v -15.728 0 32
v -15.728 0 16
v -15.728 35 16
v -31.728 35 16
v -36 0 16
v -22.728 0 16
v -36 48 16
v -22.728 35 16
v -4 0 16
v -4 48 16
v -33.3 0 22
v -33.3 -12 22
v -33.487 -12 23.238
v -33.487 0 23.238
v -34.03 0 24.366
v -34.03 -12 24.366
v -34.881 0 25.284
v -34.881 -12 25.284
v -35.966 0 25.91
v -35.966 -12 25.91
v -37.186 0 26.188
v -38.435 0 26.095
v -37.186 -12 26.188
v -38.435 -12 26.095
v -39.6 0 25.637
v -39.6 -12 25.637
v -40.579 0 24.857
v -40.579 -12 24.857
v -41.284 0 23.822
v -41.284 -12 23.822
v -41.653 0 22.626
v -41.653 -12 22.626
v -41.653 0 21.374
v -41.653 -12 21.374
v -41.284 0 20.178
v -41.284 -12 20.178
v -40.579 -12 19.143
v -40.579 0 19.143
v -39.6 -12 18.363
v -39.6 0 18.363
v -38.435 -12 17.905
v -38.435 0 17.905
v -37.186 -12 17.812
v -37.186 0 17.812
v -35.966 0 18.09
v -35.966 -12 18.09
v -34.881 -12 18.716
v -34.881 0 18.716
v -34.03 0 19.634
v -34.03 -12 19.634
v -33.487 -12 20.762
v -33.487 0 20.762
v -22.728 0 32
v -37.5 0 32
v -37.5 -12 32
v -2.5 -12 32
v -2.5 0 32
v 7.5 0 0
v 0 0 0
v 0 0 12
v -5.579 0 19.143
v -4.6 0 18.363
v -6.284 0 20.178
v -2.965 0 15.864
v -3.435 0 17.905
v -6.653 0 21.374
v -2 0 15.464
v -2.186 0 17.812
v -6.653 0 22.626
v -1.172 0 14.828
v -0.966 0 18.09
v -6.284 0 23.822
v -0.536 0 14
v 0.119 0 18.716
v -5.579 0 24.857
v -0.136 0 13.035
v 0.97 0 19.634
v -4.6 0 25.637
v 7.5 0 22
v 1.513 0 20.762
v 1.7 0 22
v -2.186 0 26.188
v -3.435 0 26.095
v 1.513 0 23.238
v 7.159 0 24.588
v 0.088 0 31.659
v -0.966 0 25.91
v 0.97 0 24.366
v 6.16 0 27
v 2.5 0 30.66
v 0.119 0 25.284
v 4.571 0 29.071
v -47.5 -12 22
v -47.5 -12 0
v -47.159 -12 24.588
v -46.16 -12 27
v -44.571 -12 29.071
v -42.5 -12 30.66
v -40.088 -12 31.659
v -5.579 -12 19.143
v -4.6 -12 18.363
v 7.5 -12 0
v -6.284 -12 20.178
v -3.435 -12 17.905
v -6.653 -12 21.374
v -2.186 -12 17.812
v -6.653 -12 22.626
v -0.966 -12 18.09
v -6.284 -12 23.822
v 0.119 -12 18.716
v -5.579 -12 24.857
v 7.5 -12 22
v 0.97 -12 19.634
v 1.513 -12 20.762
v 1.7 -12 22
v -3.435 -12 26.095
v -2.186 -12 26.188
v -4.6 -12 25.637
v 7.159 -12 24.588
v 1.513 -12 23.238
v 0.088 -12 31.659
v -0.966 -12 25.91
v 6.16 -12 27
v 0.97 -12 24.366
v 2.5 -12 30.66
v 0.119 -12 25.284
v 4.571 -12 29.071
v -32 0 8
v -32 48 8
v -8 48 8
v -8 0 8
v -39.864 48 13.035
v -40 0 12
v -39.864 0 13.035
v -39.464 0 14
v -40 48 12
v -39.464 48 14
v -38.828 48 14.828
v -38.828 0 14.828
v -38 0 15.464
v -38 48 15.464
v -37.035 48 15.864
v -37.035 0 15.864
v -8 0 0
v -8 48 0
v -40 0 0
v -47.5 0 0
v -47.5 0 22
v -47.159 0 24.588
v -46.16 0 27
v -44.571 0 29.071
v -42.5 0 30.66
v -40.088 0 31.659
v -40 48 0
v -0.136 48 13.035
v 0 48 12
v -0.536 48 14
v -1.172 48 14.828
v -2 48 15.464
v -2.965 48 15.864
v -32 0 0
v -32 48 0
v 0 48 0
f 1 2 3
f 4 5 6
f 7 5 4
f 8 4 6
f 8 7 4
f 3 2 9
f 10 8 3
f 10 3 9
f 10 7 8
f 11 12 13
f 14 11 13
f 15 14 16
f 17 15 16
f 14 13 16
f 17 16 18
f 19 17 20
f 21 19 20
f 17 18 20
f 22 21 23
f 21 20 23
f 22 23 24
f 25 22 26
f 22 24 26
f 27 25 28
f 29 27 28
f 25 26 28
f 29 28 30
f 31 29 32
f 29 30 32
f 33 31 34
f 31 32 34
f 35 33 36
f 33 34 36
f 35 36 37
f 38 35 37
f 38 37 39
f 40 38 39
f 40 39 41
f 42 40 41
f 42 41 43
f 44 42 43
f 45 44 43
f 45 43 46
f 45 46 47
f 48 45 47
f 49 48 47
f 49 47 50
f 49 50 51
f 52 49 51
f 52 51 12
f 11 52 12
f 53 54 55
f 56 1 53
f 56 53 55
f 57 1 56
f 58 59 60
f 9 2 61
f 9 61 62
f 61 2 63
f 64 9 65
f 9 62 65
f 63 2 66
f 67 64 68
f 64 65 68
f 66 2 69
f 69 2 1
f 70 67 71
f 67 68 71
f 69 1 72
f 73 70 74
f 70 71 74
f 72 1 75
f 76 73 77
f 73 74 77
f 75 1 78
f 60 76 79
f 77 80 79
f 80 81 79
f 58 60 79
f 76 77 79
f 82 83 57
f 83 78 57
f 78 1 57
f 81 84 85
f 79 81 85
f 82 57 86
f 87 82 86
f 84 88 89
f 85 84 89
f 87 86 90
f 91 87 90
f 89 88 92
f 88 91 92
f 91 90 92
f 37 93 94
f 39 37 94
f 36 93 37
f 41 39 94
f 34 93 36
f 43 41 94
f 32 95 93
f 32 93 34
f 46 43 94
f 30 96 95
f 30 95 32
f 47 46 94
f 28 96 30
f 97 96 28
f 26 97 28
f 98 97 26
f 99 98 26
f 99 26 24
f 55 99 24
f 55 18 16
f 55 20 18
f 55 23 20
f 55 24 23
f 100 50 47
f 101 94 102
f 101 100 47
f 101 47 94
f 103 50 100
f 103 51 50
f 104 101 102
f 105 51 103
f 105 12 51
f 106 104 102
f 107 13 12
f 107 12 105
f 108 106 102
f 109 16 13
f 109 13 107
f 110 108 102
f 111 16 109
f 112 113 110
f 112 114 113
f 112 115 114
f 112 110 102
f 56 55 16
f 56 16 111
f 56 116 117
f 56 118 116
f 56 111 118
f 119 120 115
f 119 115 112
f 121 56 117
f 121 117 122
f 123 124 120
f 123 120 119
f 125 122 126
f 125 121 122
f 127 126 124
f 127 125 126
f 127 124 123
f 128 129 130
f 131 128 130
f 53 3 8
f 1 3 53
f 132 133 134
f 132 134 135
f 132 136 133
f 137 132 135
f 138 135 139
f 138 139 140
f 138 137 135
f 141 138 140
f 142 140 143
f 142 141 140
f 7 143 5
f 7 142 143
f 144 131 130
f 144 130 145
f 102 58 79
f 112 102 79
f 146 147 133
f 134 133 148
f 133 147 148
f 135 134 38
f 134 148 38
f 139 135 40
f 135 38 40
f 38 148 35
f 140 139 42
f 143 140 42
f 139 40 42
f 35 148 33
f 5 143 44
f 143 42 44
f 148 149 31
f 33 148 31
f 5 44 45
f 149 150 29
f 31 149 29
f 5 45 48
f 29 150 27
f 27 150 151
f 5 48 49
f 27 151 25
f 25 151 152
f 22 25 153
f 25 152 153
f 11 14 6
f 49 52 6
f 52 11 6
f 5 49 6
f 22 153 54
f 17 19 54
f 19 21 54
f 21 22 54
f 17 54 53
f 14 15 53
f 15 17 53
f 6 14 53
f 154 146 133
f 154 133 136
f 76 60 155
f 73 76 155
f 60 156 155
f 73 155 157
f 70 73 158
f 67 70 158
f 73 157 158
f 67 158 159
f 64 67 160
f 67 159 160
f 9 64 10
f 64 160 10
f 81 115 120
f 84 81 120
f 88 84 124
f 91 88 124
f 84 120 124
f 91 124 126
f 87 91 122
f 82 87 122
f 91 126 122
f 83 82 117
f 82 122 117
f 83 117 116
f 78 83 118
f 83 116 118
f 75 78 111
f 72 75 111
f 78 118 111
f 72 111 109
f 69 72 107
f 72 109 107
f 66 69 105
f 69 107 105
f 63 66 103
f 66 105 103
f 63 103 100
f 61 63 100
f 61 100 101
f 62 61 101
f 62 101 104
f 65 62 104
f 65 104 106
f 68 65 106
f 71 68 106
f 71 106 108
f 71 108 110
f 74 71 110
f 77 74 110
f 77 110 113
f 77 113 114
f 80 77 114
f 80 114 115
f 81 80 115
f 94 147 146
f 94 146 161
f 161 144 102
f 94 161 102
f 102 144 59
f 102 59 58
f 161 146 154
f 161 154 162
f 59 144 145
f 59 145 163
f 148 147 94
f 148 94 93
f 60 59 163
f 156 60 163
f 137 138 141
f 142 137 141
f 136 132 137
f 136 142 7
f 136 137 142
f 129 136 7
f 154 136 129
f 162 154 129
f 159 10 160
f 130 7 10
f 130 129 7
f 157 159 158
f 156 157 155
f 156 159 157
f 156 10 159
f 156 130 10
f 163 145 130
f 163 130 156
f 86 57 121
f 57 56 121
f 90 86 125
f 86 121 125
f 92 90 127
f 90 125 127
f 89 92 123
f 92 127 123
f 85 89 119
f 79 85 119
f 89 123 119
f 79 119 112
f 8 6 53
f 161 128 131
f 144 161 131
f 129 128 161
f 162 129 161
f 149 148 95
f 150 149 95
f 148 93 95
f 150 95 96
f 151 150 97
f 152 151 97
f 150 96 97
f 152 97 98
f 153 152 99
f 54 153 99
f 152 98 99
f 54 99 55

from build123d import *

# Parameters (mm, degrees)
IZIM1_W                     = 40
IZIM1_H                     = 48
Y_KSEKLIK_EKSTR_ZYON1_DEPTH = 16
RADYUS4_R                   = 4
IZIM5_W                     = 24
IZIM5_H                     = 8
KES_EKSTR_ZYON1_DEPTH       = 59
IZIM6_W                     = 55
IZIM6_H                     = 32
Y_KSEKLIK_EKSTR_ZYON4_DEPTH = 12
RADYUS7_R                   = 10
IZIM9_R                     = 4.2
KES_EKSTR_ZYON2_DEPTH       = 21
IZIM10_W                    = 7
IZIM10_H                    = 35
Y_KSEKLIK_EKSTR_ZYON5_DEPTH = 16
KES_EKSTR_ZYON3_DEPTH       = 16


with BuildPart() as part:
    # Çizim1 → Yükseklik-Ekstrüzyon1 (new body)
    with BuildSketch(Plane.XY):
        with Locations((-20, 24)):
            Rectangle(IZIM1_W, IZIM1_H)
    extrude(amount=Y_KSEKLIK_EKSTR_ZYON1_DEPTH)

    # Radyus4
    radyus4_edges = [part.edges().sort_by_distance(p)[0] for p in [
        (-40, 24, 16),
        (0, 24, 16),
    ]]
    fillet(radyus4_edges, radius=RADYUS4_R)

    # Çizim5 → Kes-Ekstrüzyon1 (cut)
    with BuildSketch(Plane(origin=(0, 48, 0), x_dir=(1, 0, 0), z_dir=(0, 1, 0))):
        with Locations((-20, -4)):
            Rectangle(IZIM5_W, IZIM5_H)
    extrude(amount=-KES_EKSTR_ZYON1_DEPTH, mode=Mode.SUBTRACT)

    # Çizim6 → Yükseklik-Ekstrüzyon4 (add)
    with BuildSketch(Plane.XZ):
        with Locations((-20, 16)):
            Rectangle(IZIM6_W, IZIM6_H)
    extrude(amount=Y_KSEKLIK_EKSTR_ZYON4_DEPTH)

    # Radyus7
    radyus7_edges = [part.edges().sort_by_distance(p)[0] for p in [
        (7.5, -6, 32),
        (-47.5, -6, 32),
    ]]
    fillet(radyus7_edges, radius=RADYUS7_R)

    # Çizim9 → Kes-Ekstrüzyon2 (cut)
    with BuildSketch(Plane.XZ.offset(12)):
        with Locations((-37.5, 22)):
            Circle(IZIM9_R)
        with Locations((-2.5, 22)):
            Circle(IZIM9_R)
    extrude(amount=-KES_EKSTR_ZYON2_DEPTH, mode=Mode.SUBTRACT)

    # Çizim10 → Yükseklik-Ekstrüzyon5 (add)
    with BuildSketch(Plane.XY.offset(16)):
        with Locations((-19.227636849, 17.5)):
            Rectangle(IZIM10_W, IZIM10_H)
    extrude(amount=Y_KSEKLIK_EKSTR_ZYON5_DEPTH)

    # Çizim11 → Kes-Ekstrüzyon3 (cut)
    with BuildSketch(Plane(origin=(-15.727636849, 0, 0), x_dir=(0, 0, -1), z_dir=(1, 0, 0))):
        Polygon((-16, 35), (-32, 0), (-32, 35), align=None)
    extrude(amount=-KES_EKSTR_ZYON3_DEPTH, mode=Mode.SUBTRACT)


solid = part.part
